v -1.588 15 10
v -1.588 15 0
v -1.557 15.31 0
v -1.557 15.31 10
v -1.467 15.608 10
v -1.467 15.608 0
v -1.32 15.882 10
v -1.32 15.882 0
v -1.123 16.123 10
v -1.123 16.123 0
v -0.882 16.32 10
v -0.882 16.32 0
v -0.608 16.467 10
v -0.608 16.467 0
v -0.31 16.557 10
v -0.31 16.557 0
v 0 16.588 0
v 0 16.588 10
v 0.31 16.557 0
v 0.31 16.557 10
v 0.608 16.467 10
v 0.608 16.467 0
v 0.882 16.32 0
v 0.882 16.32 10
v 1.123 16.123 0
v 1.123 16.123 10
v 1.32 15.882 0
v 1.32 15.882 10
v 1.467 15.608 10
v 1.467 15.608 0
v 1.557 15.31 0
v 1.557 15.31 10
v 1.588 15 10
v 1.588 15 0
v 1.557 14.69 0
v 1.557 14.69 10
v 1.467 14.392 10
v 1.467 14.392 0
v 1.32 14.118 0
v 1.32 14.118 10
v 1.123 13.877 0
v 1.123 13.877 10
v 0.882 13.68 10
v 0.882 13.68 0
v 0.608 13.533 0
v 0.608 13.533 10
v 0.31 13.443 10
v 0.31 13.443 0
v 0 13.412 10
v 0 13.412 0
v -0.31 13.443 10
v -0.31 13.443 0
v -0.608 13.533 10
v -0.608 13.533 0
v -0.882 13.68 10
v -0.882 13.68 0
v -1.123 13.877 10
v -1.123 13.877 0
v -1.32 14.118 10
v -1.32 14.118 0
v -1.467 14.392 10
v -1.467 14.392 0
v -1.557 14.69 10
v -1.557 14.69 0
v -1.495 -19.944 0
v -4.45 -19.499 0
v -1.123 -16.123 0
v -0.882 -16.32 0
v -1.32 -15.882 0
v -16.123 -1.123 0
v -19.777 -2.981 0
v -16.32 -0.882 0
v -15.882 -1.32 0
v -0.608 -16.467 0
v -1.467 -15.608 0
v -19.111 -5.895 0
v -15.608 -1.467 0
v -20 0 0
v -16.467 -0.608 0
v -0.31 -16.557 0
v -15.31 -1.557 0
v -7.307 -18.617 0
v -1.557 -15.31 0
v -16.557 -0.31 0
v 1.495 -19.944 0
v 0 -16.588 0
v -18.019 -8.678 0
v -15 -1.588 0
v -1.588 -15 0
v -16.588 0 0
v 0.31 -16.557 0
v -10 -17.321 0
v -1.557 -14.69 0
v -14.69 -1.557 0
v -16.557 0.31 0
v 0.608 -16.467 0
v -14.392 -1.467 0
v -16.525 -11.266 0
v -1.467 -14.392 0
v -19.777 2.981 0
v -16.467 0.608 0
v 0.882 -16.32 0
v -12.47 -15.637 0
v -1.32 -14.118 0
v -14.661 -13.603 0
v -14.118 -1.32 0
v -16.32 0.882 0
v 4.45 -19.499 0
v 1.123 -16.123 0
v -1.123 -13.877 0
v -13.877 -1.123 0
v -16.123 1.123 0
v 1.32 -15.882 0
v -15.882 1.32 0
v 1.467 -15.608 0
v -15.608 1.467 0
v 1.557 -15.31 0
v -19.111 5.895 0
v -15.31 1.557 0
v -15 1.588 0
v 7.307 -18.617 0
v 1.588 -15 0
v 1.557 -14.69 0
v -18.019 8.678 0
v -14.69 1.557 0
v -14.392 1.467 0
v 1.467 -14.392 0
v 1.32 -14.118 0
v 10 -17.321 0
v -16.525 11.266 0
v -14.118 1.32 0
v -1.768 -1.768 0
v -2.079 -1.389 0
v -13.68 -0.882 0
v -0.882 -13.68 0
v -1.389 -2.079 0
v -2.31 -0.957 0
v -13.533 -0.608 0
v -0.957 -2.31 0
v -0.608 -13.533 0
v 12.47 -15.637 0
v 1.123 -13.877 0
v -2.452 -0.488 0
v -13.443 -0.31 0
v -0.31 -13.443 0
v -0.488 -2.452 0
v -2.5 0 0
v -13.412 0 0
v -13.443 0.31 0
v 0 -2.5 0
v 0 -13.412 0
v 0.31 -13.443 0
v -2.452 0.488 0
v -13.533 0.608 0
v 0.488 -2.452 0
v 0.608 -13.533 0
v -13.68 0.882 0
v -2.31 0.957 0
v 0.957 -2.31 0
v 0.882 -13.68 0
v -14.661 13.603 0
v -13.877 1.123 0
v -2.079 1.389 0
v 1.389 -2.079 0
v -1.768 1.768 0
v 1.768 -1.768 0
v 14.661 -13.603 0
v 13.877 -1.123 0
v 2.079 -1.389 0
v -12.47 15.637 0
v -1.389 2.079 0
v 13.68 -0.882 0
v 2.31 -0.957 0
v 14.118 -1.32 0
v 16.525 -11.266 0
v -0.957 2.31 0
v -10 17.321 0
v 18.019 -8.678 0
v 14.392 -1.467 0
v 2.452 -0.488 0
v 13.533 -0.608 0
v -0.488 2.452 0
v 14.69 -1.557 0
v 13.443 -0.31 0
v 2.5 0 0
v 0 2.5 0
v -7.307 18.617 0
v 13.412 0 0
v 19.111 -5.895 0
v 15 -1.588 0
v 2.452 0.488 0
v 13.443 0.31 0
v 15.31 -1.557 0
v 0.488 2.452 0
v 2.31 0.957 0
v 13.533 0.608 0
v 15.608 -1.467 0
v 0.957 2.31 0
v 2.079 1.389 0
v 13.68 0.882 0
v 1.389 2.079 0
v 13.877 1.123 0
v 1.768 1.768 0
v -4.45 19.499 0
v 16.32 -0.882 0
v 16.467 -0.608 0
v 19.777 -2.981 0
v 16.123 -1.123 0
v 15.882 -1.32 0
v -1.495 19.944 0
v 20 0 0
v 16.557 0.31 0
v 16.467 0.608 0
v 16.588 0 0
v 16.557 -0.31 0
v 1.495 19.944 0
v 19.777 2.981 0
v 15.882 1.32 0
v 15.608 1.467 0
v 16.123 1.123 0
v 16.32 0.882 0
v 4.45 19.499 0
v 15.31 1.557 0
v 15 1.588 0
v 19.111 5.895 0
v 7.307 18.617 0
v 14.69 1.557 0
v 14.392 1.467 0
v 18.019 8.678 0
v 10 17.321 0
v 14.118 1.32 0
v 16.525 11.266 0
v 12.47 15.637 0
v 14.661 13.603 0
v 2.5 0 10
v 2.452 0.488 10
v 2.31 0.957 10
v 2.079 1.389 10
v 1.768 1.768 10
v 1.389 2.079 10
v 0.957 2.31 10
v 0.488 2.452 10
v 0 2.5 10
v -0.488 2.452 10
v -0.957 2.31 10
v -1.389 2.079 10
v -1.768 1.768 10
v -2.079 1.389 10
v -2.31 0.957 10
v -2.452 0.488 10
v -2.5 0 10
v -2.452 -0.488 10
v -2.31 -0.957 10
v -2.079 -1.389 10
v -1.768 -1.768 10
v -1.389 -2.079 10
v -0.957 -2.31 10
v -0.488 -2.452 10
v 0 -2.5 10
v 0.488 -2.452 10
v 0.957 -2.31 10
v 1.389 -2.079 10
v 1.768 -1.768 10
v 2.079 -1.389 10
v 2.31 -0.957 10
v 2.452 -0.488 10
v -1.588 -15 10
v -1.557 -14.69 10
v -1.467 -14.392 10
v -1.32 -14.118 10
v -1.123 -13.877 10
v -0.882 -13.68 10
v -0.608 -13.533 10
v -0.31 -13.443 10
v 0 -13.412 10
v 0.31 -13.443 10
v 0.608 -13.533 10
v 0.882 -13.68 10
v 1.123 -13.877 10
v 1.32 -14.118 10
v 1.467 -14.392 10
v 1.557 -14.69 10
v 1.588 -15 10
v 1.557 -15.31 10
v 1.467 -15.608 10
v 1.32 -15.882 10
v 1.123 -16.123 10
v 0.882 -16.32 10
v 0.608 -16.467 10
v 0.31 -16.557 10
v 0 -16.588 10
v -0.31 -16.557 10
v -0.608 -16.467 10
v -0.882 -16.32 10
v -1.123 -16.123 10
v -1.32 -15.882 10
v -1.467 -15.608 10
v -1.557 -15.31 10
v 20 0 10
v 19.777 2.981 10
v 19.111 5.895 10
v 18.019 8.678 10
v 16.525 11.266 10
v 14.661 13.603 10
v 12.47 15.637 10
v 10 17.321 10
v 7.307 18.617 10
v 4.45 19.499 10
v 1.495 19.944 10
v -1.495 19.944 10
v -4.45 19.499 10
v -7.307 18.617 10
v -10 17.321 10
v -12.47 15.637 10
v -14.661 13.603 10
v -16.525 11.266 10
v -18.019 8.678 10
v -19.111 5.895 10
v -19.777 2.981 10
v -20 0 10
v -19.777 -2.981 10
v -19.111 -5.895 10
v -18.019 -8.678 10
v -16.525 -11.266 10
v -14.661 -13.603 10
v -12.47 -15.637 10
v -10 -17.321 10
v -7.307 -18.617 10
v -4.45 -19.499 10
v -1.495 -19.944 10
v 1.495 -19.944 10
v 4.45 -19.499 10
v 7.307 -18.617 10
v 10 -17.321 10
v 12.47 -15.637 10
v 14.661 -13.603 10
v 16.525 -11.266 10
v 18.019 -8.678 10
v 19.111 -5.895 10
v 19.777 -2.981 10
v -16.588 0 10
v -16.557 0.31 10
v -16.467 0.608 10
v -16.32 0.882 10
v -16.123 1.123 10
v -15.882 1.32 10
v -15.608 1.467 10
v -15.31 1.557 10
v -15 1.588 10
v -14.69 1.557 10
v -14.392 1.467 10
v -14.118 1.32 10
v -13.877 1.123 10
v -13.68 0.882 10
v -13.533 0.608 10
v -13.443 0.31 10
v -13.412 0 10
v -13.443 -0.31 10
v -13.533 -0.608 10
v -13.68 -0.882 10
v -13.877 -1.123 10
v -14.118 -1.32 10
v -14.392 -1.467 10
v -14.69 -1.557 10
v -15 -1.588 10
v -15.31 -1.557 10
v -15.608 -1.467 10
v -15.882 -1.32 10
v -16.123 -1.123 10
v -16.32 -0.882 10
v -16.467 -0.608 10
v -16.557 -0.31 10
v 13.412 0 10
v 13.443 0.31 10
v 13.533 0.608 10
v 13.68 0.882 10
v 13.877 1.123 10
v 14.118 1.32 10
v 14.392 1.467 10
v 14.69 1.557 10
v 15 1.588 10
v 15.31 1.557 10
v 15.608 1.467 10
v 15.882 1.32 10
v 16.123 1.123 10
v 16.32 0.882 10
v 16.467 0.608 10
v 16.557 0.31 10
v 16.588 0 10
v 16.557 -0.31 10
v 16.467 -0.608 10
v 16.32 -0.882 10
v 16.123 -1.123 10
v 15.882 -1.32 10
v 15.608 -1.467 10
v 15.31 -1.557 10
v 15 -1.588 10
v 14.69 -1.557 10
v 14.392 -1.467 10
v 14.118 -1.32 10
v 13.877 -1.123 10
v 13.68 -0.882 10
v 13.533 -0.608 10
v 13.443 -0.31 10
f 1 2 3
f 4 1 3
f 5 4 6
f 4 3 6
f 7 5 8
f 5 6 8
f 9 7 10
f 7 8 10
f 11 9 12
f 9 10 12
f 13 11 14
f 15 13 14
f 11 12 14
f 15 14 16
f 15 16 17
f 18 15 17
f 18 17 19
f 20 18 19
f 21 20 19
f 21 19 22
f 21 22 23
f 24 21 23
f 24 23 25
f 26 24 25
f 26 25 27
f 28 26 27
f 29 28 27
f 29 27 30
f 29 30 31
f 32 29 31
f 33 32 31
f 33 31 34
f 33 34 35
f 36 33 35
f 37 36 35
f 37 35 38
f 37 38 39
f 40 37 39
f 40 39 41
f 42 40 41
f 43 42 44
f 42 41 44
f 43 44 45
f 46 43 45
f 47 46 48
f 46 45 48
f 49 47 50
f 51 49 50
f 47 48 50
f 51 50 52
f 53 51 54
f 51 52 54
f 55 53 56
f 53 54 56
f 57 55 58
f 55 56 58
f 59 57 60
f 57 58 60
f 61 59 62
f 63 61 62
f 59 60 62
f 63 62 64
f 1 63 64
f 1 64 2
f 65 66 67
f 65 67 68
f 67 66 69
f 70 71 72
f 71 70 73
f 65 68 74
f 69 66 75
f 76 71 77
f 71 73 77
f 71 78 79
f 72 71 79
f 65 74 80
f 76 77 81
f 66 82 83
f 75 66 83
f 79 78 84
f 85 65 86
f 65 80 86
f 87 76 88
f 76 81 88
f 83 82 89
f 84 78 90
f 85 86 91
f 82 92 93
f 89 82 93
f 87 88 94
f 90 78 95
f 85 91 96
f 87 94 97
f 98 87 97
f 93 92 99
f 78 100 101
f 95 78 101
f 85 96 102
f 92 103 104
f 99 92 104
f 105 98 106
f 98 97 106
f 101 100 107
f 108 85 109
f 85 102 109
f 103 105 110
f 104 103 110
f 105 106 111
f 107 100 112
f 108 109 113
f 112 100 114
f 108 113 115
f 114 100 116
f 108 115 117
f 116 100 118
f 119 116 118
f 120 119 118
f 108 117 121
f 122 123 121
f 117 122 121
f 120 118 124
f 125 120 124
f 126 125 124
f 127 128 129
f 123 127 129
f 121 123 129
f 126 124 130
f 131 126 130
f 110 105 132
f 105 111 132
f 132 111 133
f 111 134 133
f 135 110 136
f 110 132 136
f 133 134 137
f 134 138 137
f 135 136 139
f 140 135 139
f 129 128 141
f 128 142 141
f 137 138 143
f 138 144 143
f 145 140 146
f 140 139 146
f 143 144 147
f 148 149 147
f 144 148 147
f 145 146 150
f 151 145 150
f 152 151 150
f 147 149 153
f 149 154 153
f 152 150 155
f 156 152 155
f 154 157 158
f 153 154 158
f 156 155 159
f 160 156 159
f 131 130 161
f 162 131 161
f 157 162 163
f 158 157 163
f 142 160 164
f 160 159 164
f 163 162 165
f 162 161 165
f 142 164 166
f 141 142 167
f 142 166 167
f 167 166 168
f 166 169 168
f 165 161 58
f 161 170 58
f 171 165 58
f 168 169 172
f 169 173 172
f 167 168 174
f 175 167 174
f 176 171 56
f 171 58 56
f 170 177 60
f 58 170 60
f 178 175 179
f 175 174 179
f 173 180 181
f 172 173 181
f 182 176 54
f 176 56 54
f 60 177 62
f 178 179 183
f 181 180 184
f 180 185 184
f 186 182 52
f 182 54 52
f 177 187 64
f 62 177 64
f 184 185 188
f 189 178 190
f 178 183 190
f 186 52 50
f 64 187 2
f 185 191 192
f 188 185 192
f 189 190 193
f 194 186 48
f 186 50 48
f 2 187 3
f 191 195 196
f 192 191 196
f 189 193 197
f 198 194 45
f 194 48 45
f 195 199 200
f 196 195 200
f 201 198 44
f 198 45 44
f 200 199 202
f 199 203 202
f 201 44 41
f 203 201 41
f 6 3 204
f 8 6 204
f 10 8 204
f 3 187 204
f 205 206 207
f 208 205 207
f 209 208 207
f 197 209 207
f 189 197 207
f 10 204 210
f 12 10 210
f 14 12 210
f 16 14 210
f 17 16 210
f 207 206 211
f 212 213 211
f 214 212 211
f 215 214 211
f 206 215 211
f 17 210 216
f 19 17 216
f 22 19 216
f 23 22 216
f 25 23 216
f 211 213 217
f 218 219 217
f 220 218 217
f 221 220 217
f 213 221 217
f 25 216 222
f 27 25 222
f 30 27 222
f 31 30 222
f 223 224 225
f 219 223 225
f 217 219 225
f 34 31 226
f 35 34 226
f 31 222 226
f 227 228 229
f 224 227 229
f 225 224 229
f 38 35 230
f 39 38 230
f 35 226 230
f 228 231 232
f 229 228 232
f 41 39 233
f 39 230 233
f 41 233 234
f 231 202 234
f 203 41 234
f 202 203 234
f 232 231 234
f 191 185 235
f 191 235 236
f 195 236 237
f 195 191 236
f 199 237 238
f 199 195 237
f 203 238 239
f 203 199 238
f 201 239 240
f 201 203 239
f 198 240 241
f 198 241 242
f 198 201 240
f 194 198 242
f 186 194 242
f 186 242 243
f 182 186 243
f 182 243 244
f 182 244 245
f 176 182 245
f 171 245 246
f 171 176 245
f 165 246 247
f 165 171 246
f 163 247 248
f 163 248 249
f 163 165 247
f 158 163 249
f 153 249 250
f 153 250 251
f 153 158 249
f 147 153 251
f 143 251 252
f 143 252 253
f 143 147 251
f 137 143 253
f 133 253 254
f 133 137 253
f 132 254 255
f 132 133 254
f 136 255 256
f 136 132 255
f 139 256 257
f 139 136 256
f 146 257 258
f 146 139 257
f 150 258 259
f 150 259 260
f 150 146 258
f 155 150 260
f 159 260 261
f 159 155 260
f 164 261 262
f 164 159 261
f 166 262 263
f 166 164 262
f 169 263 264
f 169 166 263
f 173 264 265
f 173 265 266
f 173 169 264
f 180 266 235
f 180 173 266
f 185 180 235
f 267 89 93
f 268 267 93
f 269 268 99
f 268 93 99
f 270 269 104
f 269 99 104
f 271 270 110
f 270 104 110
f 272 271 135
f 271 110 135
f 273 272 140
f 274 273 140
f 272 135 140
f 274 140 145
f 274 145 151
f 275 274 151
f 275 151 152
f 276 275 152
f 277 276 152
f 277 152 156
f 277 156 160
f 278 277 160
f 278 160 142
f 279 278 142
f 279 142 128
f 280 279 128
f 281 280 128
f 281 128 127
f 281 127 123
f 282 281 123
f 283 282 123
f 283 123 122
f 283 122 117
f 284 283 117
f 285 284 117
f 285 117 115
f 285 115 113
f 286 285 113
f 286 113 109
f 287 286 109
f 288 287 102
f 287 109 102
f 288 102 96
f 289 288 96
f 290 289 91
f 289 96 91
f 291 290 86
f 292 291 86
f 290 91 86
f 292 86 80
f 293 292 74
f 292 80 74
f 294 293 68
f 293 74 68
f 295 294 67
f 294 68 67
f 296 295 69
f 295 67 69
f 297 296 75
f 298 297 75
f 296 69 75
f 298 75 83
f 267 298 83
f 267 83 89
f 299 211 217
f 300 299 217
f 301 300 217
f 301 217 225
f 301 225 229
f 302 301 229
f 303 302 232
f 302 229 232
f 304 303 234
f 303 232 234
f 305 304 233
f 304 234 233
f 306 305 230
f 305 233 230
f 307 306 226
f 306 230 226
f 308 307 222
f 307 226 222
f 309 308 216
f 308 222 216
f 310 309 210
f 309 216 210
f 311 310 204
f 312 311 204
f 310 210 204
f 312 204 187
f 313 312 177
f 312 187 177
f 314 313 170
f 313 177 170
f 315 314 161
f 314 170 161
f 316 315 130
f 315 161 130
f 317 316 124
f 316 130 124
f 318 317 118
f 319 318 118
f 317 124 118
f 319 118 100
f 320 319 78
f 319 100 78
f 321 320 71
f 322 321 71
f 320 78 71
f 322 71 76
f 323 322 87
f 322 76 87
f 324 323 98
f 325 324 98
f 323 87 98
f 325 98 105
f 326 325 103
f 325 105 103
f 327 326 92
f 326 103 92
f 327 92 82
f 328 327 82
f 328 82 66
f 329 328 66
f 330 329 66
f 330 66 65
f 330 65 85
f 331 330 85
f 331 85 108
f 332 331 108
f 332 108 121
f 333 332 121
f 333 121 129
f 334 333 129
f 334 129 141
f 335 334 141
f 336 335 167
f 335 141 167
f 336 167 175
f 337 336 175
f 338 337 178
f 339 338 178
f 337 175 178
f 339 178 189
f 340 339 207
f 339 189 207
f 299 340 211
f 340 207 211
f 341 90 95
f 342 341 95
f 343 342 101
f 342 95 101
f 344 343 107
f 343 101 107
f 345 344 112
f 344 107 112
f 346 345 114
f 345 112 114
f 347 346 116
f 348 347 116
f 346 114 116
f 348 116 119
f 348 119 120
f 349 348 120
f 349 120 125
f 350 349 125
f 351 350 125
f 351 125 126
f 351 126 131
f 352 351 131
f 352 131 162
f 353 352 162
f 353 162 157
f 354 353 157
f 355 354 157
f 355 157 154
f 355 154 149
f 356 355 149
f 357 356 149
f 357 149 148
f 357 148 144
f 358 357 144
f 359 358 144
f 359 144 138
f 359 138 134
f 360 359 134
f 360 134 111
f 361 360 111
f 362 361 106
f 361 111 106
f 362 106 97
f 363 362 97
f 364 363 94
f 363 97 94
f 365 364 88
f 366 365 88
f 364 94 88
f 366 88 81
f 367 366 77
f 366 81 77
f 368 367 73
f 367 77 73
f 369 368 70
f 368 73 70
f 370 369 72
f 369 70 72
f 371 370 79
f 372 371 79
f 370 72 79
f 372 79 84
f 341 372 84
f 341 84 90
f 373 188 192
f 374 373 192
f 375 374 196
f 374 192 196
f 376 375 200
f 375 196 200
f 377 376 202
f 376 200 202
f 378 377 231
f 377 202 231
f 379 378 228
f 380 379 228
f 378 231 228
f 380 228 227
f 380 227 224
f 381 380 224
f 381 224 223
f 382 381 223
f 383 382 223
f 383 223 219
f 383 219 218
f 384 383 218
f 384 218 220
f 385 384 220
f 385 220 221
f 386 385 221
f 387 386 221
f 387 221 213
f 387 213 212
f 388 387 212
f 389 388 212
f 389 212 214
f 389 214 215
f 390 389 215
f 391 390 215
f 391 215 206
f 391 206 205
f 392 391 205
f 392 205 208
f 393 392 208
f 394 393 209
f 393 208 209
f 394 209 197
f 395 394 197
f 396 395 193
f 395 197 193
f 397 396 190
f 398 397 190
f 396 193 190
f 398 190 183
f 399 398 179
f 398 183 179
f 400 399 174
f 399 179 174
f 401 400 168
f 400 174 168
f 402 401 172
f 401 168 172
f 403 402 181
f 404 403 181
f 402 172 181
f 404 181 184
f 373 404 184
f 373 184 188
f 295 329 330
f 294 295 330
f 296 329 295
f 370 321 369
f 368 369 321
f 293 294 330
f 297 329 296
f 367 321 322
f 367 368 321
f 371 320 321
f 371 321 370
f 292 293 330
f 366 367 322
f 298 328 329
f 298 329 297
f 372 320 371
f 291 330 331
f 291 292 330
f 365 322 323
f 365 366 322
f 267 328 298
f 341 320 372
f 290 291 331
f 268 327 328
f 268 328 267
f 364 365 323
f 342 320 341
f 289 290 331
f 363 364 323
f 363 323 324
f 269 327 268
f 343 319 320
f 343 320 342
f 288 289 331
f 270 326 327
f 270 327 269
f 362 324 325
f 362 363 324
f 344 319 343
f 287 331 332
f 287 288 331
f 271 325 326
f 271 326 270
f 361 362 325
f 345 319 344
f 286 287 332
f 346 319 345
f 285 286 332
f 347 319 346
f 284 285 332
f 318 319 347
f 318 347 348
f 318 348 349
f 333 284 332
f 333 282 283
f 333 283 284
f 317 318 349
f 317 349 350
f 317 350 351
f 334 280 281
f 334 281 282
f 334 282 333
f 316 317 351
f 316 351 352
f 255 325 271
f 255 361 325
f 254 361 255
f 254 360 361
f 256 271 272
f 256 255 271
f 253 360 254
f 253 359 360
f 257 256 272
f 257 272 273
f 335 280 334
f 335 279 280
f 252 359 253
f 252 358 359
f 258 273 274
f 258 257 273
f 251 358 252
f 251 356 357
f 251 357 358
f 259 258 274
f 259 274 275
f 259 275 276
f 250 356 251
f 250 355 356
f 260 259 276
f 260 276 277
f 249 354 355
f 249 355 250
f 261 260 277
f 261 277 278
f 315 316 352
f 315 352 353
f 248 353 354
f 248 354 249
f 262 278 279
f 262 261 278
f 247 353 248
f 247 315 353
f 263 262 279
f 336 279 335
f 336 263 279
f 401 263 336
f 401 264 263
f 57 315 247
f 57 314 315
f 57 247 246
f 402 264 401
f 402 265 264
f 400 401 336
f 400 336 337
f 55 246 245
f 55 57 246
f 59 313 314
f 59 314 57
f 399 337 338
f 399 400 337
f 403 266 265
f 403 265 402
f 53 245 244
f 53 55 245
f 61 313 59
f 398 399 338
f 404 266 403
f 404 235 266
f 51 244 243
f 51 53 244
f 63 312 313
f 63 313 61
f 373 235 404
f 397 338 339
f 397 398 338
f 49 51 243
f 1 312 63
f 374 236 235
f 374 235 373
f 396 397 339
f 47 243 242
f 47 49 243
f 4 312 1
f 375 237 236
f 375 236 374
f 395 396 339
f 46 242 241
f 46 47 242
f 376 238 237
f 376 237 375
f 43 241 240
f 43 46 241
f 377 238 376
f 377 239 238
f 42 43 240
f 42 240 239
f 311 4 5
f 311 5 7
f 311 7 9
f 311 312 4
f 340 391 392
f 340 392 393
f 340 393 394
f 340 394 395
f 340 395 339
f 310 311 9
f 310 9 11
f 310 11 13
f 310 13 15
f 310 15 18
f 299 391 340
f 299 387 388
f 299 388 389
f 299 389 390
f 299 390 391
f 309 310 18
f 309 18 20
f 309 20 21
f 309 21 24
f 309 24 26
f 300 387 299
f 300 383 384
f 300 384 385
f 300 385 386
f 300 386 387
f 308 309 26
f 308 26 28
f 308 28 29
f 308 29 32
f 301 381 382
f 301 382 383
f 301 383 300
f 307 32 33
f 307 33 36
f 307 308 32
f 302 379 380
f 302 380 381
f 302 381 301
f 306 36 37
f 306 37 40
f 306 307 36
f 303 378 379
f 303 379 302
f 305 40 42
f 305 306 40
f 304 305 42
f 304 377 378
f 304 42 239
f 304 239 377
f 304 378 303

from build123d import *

# Parameters (mm, degrees)
SKETCH3_R                    = 20
SKETCH3_R_2                  = 2.5
BOSS_EXTRUDE2_DEPTH          = 10
F_1_8_0_125_DIAMETER_HOLE2_D = 3.175


with BuildPart() as part:
    # Sketch3 → Boss-Extrude2 (new body)
    with BuildSketch(Plane.XY):
        Circle(SKETCH3_R)
        Circle(SKETCH3_R_2, mode=Mode.SUBTRACT)
    extrude(amount=BOSS_EXTRUDE2_DEPTH)

    # 1/8 (0.125) Diameter Hole2 (through all)
    with Locations(Plane.XY.offset(10)):
        with Locations((0, 15), (15, 0), (0, -15), (-15, 0)):
            Hole(F_1_8_0_125_DIAMETER_HOLE2_D / 2)


solid = part.part
